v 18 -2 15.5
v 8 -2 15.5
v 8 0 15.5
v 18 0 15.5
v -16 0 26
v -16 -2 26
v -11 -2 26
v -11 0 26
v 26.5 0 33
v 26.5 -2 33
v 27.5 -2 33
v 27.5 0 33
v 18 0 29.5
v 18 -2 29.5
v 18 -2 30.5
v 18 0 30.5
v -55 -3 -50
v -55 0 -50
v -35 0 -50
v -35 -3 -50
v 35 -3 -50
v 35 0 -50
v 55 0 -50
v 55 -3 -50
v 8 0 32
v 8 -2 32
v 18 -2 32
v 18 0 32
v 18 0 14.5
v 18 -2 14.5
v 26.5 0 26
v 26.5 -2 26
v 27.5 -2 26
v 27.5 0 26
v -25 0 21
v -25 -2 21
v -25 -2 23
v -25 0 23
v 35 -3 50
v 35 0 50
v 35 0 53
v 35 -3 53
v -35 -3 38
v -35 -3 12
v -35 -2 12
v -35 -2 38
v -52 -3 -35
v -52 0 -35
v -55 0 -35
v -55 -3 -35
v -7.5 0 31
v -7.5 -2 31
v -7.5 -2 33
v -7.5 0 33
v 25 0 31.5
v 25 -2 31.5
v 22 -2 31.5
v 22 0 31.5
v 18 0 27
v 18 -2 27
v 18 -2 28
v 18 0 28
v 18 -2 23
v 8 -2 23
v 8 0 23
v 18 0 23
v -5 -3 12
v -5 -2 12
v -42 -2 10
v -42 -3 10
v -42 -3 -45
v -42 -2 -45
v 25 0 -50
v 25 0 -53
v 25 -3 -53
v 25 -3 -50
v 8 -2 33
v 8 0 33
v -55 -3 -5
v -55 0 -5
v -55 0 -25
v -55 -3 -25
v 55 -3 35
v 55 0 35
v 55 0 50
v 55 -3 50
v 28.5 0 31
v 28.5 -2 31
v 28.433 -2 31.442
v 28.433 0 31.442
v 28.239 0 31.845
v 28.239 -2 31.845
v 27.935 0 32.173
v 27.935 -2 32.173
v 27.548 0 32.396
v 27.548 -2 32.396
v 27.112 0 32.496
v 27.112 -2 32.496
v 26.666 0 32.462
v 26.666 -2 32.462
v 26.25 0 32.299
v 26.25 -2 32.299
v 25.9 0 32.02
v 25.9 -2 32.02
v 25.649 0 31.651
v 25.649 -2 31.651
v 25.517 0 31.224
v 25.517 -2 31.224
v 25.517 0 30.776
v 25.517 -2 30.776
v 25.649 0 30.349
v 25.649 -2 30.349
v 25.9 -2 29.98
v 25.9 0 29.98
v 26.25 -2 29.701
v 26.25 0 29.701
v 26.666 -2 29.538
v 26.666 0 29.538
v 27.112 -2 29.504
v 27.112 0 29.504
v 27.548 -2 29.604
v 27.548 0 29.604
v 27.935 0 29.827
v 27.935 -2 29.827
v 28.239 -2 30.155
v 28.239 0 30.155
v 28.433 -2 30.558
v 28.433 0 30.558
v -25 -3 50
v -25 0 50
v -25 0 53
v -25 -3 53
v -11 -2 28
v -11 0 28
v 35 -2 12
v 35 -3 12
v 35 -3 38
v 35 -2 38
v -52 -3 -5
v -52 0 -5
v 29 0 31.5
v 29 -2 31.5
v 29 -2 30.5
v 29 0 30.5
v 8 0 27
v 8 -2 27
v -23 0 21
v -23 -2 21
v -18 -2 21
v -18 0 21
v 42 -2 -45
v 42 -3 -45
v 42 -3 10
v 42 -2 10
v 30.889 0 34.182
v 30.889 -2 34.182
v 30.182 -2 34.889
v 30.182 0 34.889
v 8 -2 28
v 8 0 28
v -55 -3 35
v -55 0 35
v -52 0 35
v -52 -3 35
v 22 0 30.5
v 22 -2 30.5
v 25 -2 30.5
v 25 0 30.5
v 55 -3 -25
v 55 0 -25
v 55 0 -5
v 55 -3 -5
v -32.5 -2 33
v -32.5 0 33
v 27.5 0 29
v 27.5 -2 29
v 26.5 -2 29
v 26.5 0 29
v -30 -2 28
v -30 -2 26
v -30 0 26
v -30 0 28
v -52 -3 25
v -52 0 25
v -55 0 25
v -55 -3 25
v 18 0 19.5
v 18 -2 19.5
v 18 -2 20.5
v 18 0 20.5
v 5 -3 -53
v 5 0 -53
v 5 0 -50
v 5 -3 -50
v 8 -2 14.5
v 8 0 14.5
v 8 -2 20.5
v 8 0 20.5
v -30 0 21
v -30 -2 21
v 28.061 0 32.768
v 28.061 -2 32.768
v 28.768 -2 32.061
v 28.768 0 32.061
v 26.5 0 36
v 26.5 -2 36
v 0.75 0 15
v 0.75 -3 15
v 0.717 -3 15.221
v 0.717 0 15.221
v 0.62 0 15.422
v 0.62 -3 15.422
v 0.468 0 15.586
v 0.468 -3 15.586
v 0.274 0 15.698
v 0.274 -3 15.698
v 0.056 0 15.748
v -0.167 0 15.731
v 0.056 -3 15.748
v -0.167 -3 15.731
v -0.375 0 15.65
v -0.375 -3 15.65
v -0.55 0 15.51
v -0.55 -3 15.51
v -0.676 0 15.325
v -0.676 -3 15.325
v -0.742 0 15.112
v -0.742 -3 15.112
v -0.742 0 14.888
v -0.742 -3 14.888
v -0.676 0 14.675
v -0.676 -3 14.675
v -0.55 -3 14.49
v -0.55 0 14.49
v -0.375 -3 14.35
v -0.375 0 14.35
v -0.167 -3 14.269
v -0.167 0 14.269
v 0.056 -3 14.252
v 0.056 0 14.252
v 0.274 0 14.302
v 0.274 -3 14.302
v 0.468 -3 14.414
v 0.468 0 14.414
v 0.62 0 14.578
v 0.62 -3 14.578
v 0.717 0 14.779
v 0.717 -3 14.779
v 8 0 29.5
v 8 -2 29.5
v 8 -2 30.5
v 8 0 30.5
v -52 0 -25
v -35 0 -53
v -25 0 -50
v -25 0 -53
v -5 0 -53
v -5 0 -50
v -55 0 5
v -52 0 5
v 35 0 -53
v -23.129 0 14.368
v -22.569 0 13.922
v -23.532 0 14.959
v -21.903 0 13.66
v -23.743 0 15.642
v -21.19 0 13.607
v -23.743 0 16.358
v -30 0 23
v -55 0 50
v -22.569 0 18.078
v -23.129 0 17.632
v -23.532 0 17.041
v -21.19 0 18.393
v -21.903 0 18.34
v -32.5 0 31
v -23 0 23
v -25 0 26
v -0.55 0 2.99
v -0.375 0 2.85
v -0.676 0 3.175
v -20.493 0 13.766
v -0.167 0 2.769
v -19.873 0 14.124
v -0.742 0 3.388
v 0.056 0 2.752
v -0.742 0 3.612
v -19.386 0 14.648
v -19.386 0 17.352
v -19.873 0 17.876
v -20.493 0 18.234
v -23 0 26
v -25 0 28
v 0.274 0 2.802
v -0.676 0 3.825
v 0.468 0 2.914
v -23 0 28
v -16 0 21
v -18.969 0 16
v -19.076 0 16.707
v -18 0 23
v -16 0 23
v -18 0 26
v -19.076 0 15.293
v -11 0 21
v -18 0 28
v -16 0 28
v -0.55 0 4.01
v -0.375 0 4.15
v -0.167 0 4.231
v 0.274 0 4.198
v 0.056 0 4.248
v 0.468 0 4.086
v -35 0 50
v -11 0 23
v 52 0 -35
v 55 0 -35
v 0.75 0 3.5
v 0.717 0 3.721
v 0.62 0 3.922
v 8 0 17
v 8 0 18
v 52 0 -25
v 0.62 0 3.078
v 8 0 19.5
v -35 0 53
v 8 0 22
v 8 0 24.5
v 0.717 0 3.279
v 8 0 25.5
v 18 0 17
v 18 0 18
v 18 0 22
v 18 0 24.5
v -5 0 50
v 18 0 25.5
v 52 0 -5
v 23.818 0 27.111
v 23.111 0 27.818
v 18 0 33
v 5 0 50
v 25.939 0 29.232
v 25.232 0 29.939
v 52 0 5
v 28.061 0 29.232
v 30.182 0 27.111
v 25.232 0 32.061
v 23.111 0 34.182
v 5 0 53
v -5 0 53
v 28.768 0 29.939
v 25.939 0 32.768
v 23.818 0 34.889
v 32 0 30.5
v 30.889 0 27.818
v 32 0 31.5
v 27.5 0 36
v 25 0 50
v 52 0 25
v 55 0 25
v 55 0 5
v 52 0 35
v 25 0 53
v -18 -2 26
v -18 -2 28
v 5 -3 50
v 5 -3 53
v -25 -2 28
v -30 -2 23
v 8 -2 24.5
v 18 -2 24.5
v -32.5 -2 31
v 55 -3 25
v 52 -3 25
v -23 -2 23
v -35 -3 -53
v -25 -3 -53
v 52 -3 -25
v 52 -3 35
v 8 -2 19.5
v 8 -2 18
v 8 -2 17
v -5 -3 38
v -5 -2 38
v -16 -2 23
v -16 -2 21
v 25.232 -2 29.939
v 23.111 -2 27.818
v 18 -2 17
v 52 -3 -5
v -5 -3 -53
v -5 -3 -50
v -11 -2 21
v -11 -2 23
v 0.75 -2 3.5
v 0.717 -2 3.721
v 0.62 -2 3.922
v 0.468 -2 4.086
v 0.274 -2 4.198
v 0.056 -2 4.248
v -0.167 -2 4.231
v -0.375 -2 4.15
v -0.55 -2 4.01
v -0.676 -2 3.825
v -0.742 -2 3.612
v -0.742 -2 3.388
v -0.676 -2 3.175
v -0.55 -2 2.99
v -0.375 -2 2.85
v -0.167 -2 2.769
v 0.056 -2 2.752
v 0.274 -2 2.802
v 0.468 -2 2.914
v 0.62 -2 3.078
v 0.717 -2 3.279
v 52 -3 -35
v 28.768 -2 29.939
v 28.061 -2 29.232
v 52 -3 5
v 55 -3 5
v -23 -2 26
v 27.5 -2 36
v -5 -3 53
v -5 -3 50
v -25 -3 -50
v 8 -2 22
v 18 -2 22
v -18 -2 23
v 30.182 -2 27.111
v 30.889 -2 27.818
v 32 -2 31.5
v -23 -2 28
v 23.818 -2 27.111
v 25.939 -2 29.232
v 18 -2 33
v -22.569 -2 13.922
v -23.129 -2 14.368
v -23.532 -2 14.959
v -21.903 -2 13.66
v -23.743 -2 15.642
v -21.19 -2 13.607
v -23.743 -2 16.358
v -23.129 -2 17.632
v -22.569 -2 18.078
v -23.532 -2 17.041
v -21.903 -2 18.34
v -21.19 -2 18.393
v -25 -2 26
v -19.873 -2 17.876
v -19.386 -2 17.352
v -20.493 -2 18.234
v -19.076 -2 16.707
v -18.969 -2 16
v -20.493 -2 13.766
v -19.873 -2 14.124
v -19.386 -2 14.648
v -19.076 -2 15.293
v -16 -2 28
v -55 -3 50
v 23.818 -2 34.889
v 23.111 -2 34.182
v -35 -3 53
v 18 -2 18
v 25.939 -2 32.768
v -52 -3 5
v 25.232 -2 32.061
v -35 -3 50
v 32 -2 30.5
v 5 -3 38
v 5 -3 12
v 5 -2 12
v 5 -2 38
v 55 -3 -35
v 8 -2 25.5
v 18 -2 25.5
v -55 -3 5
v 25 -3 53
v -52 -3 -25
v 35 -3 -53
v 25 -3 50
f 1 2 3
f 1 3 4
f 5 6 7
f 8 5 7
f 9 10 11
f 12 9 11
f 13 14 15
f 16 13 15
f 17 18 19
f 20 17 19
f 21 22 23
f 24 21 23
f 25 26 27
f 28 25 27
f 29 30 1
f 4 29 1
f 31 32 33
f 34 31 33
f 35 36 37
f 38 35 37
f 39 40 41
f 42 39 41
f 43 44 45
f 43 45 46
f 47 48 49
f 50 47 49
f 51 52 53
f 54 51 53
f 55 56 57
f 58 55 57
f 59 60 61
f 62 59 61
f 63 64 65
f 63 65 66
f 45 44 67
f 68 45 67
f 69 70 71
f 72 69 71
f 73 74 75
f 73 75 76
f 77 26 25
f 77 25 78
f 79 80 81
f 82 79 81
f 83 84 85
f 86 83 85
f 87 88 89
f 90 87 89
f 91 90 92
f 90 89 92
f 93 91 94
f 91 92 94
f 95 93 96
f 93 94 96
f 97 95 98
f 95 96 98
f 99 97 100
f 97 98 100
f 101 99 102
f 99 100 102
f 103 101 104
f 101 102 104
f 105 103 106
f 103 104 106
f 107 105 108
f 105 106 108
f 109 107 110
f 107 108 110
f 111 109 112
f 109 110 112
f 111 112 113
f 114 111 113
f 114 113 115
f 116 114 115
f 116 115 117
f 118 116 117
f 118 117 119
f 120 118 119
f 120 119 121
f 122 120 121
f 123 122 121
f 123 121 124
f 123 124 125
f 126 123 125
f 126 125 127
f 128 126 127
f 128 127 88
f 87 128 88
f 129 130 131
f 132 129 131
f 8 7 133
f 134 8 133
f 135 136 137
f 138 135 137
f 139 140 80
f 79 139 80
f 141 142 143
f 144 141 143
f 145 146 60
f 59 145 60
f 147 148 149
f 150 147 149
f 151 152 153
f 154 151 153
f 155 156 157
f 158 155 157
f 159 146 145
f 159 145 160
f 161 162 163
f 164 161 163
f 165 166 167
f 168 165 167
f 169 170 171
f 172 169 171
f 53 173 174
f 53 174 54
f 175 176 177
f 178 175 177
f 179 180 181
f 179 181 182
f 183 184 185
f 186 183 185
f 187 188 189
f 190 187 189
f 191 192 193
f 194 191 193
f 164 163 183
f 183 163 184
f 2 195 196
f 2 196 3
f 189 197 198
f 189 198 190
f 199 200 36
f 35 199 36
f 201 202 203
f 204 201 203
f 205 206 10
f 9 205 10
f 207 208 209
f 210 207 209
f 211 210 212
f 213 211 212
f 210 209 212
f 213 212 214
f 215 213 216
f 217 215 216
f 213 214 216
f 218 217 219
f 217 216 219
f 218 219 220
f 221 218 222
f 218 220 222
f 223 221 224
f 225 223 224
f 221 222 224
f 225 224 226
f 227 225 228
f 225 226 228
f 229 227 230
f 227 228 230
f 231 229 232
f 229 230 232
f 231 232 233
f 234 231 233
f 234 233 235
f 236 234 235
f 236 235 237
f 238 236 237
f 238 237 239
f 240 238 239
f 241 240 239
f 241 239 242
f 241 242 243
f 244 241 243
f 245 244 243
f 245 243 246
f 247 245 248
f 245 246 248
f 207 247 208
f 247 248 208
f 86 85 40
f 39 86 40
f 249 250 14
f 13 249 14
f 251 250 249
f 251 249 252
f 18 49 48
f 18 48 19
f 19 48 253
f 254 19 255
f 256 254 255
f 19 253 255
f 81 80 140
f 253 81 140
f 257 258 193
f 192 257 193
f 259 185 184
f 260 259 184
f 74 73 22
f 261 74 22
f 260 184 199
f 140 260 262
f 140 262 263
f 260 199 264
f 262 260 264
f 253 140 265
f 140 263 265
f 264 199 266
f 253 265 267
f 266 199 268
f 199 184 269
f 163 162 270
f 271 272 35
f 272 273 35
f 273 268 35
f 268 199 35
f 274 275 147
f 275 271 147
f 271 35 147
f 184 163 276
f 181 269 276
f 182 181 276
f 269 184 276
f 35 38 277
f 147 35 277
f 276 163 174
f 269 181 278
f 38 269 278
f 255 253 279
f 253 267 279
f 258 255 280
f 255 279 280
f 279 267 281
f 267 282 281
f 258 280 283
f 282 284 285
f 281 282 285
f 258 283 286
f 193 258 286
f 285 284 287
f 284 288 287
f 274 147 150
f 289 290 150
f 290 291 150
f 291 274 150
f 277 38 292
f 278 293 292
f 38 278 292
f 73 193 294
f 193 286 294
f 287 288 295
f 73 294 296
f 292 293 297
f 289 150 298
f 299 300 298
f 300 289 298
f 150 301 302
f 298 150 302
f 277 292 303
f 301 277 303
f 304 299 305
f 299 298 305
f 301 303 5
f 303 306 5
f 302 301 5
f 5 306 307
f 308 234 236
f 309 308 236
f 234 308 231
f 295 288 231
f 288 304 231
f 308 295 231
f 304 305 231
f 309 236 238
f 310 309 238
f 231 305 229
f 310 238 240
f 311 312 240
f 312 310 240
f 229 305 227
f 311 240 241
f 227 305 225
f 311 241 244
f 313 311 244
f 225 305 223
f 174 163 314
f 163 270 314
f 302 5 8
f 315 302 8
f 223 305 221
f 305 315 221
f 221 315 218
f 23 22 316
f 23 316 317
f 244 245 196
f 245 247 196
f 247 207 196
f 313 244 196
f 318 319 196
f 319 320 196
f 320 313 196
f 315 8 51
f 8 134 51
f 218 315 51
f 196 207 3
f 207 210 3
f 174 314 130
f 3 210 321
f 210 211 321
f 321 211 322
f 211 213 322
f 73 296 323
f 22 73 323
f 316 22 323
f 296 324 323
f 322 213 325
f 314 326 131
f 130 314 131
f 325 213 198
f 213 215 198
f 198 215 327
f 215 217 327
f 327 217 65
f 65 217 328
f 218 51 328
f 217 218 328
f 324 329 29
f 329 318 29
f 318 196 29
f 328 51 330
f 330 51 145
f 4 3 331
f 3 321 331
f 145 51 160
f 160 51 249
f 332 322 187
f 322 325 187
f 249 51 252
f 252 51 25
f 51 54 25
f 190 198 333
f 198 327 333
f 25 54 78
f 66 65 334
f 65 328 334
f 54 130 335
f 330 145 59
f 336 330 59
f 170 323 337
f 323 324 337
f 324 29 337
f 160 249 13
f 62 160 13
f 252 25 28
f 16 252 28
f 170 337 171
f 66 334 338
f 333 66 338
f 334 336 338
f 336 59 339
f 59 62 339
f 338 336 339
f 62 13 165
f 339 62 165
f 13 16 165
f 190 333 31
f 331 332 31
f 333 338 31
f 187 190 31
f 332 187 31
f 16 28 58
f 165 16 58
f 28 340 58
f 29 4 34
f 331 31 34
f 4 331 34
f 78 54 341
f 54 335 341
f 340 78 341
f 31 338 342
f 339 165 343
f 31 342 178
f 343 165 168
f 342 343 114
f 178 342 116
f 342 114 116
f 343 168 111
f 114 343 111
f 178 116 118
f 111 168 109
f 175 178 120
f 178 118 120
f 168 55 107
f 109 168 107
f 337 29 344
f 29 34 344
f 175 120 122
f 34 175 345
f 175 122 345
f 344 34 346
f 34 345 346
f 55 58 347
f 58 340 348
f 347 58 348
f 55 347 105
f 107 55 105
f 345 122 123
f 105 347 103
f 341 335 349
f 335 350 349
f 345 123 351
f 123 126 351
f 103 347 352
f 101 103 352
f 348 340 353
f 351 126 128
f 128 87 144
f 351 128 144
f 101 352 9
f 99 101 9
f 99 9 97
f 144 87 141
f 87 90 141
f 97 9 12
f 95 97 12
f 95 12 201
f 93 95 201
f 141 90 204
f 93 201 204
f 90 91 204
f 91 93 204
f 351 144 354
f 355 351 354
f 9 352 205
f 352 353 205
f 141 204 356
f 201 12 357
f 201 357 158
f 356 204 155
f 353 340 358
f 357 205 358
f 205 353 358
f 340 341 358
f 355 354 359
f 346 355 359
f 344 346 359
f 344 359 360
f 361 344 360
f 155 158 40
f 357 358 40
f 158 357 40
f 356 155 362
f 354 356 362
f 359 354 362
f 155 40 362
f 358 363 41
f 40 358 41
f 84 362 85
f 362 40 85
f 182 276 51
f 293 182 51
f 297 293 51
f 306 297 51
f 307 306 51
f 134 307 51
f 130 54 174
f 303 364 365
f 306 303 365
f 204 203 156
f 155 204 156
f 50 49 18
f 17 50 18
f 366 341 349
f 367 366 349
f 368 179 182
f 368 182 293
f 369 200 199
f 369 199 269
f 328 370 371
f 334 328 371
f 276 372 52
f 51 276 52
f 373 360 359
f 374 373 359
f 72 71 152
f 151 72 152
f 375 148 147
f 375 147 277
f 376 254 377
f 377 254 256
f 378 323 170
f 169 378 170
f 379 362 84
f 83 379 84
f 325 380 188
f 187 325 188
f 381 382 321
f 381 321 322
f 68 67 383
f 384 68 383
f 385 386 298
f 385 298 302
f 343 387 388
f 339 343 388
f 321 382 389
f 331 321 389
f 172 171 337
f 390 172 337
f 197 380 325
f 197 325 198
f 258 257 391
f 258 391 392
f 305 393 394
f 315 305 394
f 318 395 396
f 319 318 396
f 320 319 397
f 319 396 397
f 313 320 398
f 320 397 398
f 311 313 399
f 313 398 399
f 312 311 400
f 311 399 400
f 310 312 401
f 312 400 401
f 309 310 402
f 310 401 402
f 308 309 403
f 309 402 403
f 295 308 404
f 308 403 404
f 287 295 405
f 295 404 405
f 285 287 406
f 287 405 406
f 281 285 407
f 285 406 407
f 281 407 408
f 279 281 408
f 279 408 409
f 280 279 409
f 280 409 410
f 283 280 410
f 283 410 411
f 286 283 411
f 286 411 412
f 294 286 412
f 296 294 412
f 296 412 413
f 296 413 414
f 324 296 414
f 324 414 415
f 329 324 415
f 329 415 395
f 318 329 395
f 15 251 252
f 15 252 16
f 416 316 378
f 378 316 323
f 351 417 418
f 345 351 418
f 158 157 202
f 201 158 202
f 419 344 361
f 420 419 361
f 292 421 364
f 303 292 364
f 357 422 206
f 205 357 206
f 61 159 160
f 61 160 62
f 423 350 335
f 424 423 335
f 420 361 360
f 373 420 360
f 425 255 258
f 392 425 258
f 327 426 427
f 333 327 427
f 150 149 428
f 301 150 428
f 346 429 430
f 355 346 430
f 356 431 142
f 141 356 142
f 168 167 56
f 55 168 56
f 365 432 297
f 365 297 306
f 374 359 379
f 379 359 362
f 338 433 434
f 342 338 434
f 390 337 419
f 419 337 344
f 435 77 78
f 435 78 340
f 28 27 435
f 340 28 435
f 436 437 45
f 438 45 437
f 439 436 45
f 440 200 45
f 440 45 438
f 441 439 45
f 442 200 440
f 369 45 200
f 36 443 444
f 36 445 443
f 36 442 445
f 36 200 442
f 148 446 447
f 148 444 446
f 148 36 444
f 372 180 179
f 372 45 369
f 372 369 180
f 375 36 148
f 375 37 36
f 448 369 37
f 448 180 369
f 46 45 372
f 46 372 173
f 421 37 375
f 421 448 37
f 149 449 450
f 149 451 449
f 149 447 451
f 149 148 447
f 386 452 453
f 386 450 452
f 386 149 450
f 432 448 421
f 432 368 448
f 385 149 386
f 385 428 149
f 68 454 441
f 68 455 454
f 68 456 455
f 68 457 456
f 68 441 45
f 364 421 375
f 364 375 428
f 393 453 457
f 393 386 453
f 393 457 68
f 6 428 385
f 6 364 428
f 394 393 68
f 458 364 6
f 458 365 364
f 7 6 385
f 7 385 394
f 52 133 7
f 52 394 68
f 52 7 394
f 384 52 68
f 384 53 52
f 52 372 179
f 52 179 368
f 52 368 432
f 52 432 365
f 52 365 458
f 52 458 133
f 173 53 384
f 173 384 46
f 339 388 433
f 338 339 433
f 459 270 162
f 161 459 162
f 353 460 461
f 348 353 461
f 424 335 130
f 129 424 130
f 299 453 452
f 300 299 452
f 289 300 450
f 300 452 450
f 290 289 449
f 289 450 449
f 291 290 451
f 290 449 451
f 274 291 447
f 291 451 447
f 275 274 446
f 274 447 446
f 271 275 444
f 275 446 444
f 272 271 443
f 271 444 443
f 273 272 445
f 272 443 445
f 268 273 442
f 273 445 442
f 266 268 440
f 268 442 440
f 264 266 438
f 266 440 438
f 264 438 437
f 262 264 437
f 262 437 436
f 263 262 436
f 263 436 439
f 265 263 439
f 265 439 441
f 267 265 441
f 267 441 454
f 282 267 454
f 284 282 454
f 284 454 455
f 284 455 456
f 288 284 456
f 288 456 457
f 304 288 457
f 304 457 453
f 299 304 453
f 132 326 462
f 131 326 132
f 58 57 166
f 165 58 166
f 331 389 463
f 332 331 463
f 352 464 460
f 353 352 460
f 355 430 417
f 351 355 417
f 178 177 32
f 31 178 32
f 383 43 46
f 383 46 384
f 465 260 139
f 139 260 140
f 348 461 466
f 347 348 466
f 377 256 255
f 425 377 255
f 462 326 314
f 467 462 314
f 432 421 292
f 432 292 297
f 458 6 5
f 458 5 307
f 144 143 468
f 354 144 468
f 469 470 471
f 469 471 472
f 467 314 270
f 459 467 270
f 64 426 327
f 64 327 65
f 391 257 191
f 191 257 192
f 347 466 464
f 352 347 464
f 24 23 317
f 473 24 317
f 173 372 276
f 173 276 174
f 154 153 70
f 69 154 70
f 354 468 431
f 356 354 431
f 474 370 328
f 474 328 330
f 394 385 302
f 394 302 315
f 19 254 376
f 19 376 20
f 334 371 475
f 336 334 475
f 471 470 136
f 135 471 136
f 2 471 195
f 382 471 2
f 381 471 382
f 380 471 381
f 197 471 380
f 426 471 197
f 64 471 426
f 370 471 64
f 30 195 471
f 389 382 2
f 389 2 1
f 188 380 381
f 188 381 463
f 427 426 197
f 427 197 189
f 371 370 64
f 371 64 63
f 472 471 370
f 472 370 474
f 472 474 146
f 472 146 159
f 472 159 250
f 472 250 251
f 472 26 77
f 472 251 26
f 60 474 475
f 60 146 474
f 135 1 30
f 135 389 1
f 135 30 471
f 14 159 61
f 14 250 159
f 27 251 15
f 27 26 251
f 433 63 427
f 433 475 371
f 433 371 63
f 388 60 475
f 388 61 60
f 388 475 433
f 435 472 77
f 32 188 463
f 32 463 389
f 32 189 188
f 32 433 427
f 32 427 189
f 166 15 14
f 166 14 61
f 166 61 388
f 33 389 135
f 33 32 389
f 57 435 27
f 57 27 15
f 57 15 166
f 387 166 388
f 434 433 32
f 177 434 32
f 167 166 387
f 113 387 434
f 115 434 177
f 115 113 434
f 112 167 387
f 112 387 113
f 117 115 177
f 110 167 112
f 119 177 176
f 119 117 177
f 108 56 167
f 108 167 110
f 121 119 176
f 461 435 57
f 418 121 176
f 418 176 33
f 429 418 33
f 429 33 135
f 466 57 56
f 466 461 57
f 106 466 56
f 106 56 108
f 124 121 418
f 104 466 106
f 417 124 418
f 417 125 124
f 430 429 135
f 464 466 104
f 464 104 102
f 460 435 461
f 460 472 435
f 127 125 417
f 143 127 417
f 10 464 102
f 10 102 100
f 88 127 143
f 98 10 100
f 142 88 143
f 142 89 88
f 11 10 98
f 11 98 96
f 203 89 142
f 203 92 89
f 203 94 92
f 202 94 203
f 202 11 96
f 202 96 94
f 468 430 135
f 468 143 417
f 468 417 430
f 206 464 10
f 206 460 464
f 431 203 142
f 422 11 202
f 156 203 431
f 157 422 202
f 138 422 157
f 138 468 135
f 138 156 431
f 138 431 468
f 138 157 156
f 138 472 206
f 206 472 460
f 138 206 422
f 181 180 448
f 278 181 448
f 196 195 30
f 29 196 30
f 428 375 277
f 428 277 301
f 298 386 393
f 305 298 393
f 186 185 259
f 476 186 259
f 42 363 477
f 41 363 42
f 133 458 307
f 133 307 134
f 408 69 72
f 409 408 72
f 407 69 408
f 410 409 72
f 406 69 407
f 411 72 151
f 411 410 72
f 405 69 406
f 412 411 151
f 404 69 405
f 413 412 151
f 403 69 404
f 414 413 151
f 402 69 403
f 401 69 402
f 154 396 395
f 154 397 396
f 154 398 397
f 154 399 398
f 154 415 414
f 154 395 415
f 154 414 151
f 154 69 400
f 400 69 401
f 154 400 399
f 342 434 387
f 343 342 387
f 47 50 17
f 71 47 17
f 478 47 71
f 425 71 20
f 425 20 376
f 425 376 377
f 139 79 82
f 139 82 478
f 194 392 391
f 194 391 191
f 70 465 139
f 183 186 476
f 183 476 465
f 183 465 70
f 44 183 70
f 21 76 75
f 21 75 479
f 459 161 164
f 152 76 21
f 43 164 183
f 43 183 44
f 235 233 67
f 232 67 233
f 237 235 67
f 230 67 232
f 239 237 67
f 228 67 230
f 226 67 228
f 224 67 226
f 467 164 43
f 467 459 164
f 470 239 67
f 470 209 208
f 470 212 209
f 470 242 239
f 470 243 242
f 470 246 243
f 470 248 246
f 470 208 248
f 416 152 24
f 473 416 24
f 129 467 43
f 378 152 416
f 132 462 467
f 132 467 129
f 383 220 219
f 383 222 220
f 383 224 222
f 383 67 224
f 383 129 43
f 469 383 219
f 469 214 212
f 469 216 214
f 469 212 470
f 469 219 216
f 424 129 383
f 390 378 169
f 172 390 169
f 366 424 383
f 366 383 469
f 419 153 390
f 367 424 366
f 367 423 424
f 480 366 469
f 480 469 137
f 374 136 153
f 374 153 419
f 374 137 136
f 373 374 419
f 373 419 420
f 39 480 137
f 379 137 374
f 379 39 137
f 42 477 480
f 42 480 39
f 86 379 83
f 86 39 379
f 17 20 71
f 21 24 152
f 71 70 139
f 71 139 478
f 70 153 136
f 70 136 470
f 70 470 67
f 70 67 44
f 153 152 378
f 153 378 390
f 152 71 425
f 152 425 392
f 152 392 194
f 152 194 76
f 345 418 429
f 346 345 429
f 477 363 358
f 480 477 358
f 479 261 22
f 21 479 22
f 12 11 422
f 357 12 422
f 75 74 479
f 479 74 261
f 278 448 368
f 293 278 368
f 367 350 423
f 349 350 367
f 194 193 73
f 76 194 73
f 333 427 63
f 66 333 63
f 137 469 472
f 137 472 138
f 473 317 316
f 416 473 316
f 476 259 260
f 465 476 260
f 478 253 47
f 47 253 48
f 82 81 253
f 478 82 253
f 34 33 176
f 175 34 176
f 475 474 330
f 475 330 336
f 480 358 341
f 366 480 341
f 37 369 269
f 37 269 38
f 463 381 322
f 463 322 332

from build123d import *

# Parameters (mm, degrees)
F0_W     = 10
F0_H     = 3
F1_DEPTH = 3
F2_R     = 0.75
F2_W     = 5
F2_H     = 2
F2_R_2   = 2.4
F2_W_2   = 25
F2_W_3   = 10
F2_H_2   = 1
F2_R_3   = 1.5
F3_DEPTH = 3
F2_W_4   = 30
F2_H_3   = 26
F4_DEPTH = 1


# Not quite as in the source:
# - a feature names something its author has since deleted; it is built from what else it names


with BuildPart() as f1:
    # F0 (on Front) → F1 (new body)
    with BuildSketch(Plane.XZ):
        with Locations((-30, 51.5)):
            Rectangle(F0_W, F0_H)
        with Locations((0, 51.5)):
            Rectangle(F0_W, F0_H)
        with Locations((30, 51.5)):
            Rectangle(F0_W, F0_H)
        with Locations((-30, 48.5)):
            Rectangle(F0_W, F0_H)
        with Locations((0, 48.5)):
            Rectangle(F0_W, F0_H)
        with Locations((30, 48.5)):
            Rectangle(F0_W, F0_H)
        Polygon((-35, 50), (-55, 50), (-55, 35), (-52, 35), (-52, 25), (-55, 25), (-55, 5), (-52, 5), (-52, -5), (-55, -5), (-55, -25), (-52, -25), (-52, -35), (-55, -35), (-55, -50), (-35, -50), (-35, -47), (-25, -47), (-25, -50), (-5, -50), (-5, -47), (5, -47), (5, -50), (25, -50), (25, -47), (35, -47), (35, -50), (55, -50), (55, -35), (52, -35), (52, -25), (55, -25), (55, -5), (52, -5), (52, 5), (55, 5), (55, 25), (52, 25), (52, 35), (55, 35), (55, 50), (35, 50), (35, 47), (25, 47), (25, 50), (5, 50), (5, 47), (-5, 47), (-5, 50), (-25, 50), (-25, 47), (-35, 47), align=None)
        with Locations((30, -48.5)):
            Rectangle(F0_W, F0_H)
        with Locations((30, -51.5)):
            Rectangle(F0_W, F0_H)
        with Locations((0, -48.5)):
            Rectangle(F0_W, F0_H)
        with Locations((0, -51.5)):
            Rectangle(F0_W, F0_H)
        with Locations((-30, -48.5)):
            Rectangle(F0_W, F0_H)
        with Locations((-30, -51.5)):
            Rectangle(F0_W, F0_H)
    extrude(amount=F1_DEPTH)

    # F2 (on face) → F3 (cut)
    with BuildSketch(Plane.XZ.offset(3)):
        with Locations((0, 15)):
            Circle(F2_R)
        with Locations((-13.5, 22)):
            Rectangle(F2_W, F2_H)
        with Locations((-20.5, 22)):
            Rectangle(F2_W, F2_H)
        with Locations((-21.369388327, 16)):
            Circle(F2_R_2)
        with Locations((-27.5, 22)):
            Rectangle(F2_W, F2_H)
        with Locations((-27.5, 27)):
            Rectangle(F2_W, F2_H)
        with Locations((-20.5, 27)):
            Rectangle(F2_W, F2_H)
        with Locations((-13.5, 27)):
            Rectangle(F2_W, F2_H)
        with Locations((-20, 32)):
            Rectangle(F2_W_2, F2_H)
        with Locations((13, 32.5)):
            Rectangle(F2_W_3, F2_H_2)
        with Locations((13, 30)):
            Rectangle(F2_W_3, F2_H_2)
        with Locations((13, 27.5)):
            Rectangle(F2_W_3, F2_H_2)
        with Locations((13, 25)):
            Rectangle(F2_W_3, F2_H_2)
        with Locations((13, 22.5)):
            Rectangle(F2_W_3, F2_H_2)
        with Locations((13, 20)):
            Rectangle(F2_W_3, F2_H_2)
        with Locations((13, 17.5)):
            Rectangle(F2_W_3, F2_H_2)
        with Locations((13, 15)):
            Rectangle(F2_W_3, F2_H_2)
        with Locations((0, 3.5)):
            Circle(F2_R)
        Polygon((28.0606601718, 32.767766953), (28.4142135865, 32.4142135383), (28.767766953, 32.0606601718), (30.8890872965, 34.1819805153), (30.1819805153, 34.8890872965), align=None)
        Polygon((26.5, 33), (27, 33), (27.5, 33), (27.5, 36), (26.5, 36), align=None)
        Polygon((25.232233047, 32.0606601718), (25.5857864376, 32.4142135624), (25.9393398282, 32.767766953), (23.8180194847, 34.8890872965), (23.1109127035, 34.1819805153), align=None)
        Polygon((25, 30.5), (25, 31), (25, 31.5), (22, 31.5), (22, 30.5), align=None)
        Polygon((25.9393398282, 29.232233047), (25.5857864376, 29.5857864376), (25.232233047, 29.9393398282), (23.1109127035, 27.8180194847), (23.8180194847, 27.1109127035), align=None)
        Polygon((27.5, 29), (27, 29), (26.5, 29), (26.5, 26), (27.5, 26), align=None)
        Polygon((28.767766953, 29.9393398282), (28.4142135624, 29.5857864376), (28.0606601718, 29.232233047), (30.1819805153, 27.1109127035), (30.8890872965, 27.8180194847), align=None)
        Polygon((29, 31.5), (29, 31), (29, 30.5), (32, 30.5), (32, 31.5), align=None)
        with Locations((27, 31)):
            Circle(F2_R_3)
    extrude(amount=-F3_DEPTH, mode=Mode.SUBTRACT)

    # F2 (on face) → F4 (cut)
    with BuildSketch(Plane.XZ.offset(3)):
        with Locations((20, 25)):
            Rectangle(F2_W_4, F2_H_3)
        with Locations((13, 15)):
            Rectangle(F2_W_3, F2_H_2, mode=Mode.SUBTRACT)
        with Locations((13, 17.5)):
            Rectangle(F2_W_3, F2_H_2, mode=Mode.SUBTRACT)
        with Locations((13, 20)):
            Rectangle(F2_W_3, F2_H_2, mode=Mode.SUBTRACT)
        with Locations((13, 22.5)):
            Rectangle(F2_W_3, F2_H_2, mode=Mode.SUBTRACT)
        with Locations((13, 25)):
            Rectangle(F2_W_3, F2_H_2, mode=Mode.SUBTRACT)
        with Locations((13, 27.5)):
            Rectangle(F2_W_3, F2_H_2, mode=Mode.SUBTRACT)
        with Locations((13, 30)):
            Rectangle(F2_W_3, F2_H_2, mode=Mode.SUBTRACT)
        with Locations((13, 32.5)):
            Rectangle(F2_W_3, F2_H_2, mode=Mode.SUBTRACT)
        Polygon((26.5, 29), (27, 29), (27.5, 29), (27.5, 26), (26.5, 26), align=None, mode=Mode.SUBTRACT)
        Polygon((25.232233047, 29.9393398282), (25.5857864376, 29.5857864376), (25.9393398282, 29.232233047), (23.8180194847, 27.1109127035), (23.1109127035, 27.8180194847), align=None, mode=Mode.SUBTRACT)
        Polygon((25, 31.5), (25, 31), (25, 30.5), (22, 30.5), (22, 31.5), align=None, mode=Mode.SUBTRACT)
        with BuildLine():
            ThreePointArc((28.4142135865, 32.4142135383), (28.8477590715, 31.765366849), (29, 31))
            ThreePointArc((29, 31), (28.847759065, 30.2346331353), (28.4142135624, 29.5857864376))
            ThreePointArc((28.4142135624, 29.5857864376), (27.7653668647, 29.152240935), (27, 29))
            ThreePointArc((27, 29), (26.2346331353, 29.152240935), (25.5857864376, 29.5857864376))
            ThreePointArc((25.5857864376, 29.5857864376), (25.152240935, 30.2346331353), (25, 31))
            ThreePointArc((25, 31), (25.152240935, 31.7653668647), (25.5857864376, 32.4142135624))
            ThreePointArc((25.5857864376, 32.4142135624), (26.2346331353, 32.847759065), (27, 33))
            ThreePointArc((27, 33), (27.7653668805, 32.8477590585), (28.4142135865, 32.4142135383))
        make_face(mode=Mode.SUBTRACT)
        Polygon((25.9393398282, 32.767766953), (25.5857864376, 32.4142135624), (25.232233047, 32.0606601718), (23.1109127035, 34.1819805153), (23.8180194847, 34.8890872965), align=None, mode=Mode.SUBTRACT)
        Polygon((27.5, 33), (27, 33), (26.5, 33), (26.5, 36), (27.5, 36), align=None, mode=Mode.SUBTRACT)
        Polygon((28.0606601718, 29.232233047), (28.4142135624, 29.5857864376), (28.767766953, 29.9393398282), (30.8890872965, 27.8180194847), (30.1819805153, 27.1109127035), align=None, mode=Mode.SUBTRACT)
        Polygon((29, 30.5), (29, 31), (29, 31.5), (32, 31.5), (32, 30.5), align=None, mode=Mode.SUBTRACT)
        Polygon((28.767766953, 32.0606601718), (28.4142135865, 32.4142135383), (28.0606601718, 32.767766953), (30.1819805153, 34.8890872965), (30.8890872965, 34.1819805153), align=None, mode=Mode.SUBTRACT)
        with Locations((-20, 25)):
            Rectangle(F2_W_4, F2_H_3)
        with Locations((-21.369388327, 16)):
            Circle(F2_R_2, mode=Mode.SUBTRACT)
        with Locations((-27.5, 22)):
            Rectangle(F2_W, F2_H, mode=Mode.SUBTRACT)
        with Locations((-20.5, 22)):
            Rectangle(F2_W, F2_H, mode=Mode.SUBTRACT)
        with Locations((-13.5, 22)):
            Rectangle(F2_W, F2_H, mode=Mode.SUBTRACT)
        with Locations((-27.5, 27)):
            Rectangle(F2_W, F2_H, mode=Mode.SUBTRACT)
        with Locations((-20.5, 27)):
            Rectangle(F2_W, F2_H, mode=Mode.SUBTRACT)
        with Locations((-20, 32)):
            Rectangle(F2_W_2, F2_H, mode=Mode.SUBTRACT)
        with Locations((-13.5, 27)):
            Rectangle(F2_W, F2_H, mode=Mode.SUBTRACT)
        with BuildLine():
            ThreePointArc((28.4142135624, 29.5857864376), (28.847759065, 30.2346331353), (29, 31))
            ThreePointArc((29, 31), (28.8477590715, 31.765366849), (28.4142135865, 32.4142135383))
            ThreePointArc((28.4142135865, 32.4142135383), (27.7653668805, 32.8477590585), (27, 33))
            ThreePointArc((27, 33), (26.2346331353, 32.847759065), (25.5857864376, 32.4142135624))
            ThreePointArc((25.5857864376, 32.4142135624), (25.152240935, 31.7653668647), (25, 31))
            ThreePointArc((25, 31), (25.152240935, 30.2346331353), (25.5857864376, 29.5857864376))
            ThreePointArc((25.5857864376, 29.5857864376), (26.2346331353, 29.152240935), (27, 29))
            ThreePointArc((27, 29), (27.7653668647, 29.152240935), (28.4142135624, 29.5857864376))
        make_face()
        with Locations((27, 31)):
            Circle(F2_R_3, mode=Mode.SUBTRACT)
        Polygon((-35, 10), (-42, 10), (-42, -45), (42, -45), (42, 10), (35, 10), (5, 10), (-5, 10), align=None)
        with Locations((0, 3.5)):
            Circle(F2_R, mode=Mode.SUBTRACT)
    extrude(amount=-F4_DEPTH, mode=Mode.SUBTRACT)


solid = f1.part
